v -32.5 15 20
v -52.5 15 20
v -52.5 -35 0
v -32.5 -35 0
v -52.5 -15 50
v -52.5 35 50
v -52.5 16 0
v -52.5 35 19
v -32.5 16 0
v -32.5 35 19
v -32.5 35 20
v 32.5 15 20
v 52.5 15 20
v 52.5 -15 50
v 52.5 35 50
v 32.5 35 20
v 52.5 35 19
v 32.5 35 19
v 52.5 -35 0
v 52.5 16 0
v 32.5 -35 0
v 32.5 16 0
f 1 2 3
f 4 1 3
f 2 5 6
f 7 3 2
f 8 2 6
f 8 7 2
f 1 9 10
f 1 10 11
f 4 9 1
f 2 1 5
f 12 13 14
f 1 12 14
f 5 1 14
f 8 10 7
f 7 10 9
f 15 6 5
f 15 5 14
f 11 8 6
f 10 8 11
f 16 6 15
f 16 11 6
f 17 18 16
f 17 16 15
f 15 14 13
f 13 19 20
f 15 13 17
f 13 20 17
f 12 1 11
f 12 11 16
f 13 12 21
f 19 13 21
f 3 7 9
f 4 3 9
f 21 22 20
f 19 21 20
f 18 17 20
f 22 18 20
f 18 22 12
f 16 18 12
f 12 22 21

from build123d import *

# Parameters (mm, degrees)
F0_W     = 105
F0_H     = 70
F1_DEPTH = 50
F3_DEPTH = 105.001
F5_DEPTH = 105.001
F6_W     = 65
F6_H     = 40
F7_DEPTH = 70.001
F9_DEPTH = 105.001


with BuildPart() as f1:
    # F0 (on Top) → F1 (new body)
    with BuildSketch(Plane.XY):
        Rectangle(F0_W, F0_H)
    extrude(amount=F1_DEPTH)

    # F2 (on face) → F3 (cut, through all)
    with BuildSketch(Plane.YZ.offset(52.5)):
        Polygon((16, 0), (35, 0), (35, 19), align=None)
    extrude(amount=-F3_DEPTH, mode=Mode.SUBTRACT)

    # F4 (on face) → F5 (cut, through all)
    with BuildSketch(Plane.YZ.offset(52.5)):
        Polygon((-44.933475, 79.933475), (-35, 20), (15, 20), align=None)
    extrude(amount=-F5_DEPTH, mode=Mode.SUBTRACT)

    # F6 (on face) → F7 (cut, through all)
    with BuildSketch(Plane.XZ.offset(35)):
        Rectangle(F6_W, F6_H)
    extrude(amount=-F7_DEPTH, mode=Mode.SUBTRACT)

    # F8 (on face) → F9 (cut, through all)
    with BuildSketch(Plane(origin=(-52.5, 0, 0), x_dir=(0, -1, 0), z_dir=(-1, 0, 0))):
        Polygon((35, 0), (35, 20), (-15, 20), align=None)
    extrude(amount=-F9_DEPTH, mode=Mode.SUBTRACT)


solid = f1.part
